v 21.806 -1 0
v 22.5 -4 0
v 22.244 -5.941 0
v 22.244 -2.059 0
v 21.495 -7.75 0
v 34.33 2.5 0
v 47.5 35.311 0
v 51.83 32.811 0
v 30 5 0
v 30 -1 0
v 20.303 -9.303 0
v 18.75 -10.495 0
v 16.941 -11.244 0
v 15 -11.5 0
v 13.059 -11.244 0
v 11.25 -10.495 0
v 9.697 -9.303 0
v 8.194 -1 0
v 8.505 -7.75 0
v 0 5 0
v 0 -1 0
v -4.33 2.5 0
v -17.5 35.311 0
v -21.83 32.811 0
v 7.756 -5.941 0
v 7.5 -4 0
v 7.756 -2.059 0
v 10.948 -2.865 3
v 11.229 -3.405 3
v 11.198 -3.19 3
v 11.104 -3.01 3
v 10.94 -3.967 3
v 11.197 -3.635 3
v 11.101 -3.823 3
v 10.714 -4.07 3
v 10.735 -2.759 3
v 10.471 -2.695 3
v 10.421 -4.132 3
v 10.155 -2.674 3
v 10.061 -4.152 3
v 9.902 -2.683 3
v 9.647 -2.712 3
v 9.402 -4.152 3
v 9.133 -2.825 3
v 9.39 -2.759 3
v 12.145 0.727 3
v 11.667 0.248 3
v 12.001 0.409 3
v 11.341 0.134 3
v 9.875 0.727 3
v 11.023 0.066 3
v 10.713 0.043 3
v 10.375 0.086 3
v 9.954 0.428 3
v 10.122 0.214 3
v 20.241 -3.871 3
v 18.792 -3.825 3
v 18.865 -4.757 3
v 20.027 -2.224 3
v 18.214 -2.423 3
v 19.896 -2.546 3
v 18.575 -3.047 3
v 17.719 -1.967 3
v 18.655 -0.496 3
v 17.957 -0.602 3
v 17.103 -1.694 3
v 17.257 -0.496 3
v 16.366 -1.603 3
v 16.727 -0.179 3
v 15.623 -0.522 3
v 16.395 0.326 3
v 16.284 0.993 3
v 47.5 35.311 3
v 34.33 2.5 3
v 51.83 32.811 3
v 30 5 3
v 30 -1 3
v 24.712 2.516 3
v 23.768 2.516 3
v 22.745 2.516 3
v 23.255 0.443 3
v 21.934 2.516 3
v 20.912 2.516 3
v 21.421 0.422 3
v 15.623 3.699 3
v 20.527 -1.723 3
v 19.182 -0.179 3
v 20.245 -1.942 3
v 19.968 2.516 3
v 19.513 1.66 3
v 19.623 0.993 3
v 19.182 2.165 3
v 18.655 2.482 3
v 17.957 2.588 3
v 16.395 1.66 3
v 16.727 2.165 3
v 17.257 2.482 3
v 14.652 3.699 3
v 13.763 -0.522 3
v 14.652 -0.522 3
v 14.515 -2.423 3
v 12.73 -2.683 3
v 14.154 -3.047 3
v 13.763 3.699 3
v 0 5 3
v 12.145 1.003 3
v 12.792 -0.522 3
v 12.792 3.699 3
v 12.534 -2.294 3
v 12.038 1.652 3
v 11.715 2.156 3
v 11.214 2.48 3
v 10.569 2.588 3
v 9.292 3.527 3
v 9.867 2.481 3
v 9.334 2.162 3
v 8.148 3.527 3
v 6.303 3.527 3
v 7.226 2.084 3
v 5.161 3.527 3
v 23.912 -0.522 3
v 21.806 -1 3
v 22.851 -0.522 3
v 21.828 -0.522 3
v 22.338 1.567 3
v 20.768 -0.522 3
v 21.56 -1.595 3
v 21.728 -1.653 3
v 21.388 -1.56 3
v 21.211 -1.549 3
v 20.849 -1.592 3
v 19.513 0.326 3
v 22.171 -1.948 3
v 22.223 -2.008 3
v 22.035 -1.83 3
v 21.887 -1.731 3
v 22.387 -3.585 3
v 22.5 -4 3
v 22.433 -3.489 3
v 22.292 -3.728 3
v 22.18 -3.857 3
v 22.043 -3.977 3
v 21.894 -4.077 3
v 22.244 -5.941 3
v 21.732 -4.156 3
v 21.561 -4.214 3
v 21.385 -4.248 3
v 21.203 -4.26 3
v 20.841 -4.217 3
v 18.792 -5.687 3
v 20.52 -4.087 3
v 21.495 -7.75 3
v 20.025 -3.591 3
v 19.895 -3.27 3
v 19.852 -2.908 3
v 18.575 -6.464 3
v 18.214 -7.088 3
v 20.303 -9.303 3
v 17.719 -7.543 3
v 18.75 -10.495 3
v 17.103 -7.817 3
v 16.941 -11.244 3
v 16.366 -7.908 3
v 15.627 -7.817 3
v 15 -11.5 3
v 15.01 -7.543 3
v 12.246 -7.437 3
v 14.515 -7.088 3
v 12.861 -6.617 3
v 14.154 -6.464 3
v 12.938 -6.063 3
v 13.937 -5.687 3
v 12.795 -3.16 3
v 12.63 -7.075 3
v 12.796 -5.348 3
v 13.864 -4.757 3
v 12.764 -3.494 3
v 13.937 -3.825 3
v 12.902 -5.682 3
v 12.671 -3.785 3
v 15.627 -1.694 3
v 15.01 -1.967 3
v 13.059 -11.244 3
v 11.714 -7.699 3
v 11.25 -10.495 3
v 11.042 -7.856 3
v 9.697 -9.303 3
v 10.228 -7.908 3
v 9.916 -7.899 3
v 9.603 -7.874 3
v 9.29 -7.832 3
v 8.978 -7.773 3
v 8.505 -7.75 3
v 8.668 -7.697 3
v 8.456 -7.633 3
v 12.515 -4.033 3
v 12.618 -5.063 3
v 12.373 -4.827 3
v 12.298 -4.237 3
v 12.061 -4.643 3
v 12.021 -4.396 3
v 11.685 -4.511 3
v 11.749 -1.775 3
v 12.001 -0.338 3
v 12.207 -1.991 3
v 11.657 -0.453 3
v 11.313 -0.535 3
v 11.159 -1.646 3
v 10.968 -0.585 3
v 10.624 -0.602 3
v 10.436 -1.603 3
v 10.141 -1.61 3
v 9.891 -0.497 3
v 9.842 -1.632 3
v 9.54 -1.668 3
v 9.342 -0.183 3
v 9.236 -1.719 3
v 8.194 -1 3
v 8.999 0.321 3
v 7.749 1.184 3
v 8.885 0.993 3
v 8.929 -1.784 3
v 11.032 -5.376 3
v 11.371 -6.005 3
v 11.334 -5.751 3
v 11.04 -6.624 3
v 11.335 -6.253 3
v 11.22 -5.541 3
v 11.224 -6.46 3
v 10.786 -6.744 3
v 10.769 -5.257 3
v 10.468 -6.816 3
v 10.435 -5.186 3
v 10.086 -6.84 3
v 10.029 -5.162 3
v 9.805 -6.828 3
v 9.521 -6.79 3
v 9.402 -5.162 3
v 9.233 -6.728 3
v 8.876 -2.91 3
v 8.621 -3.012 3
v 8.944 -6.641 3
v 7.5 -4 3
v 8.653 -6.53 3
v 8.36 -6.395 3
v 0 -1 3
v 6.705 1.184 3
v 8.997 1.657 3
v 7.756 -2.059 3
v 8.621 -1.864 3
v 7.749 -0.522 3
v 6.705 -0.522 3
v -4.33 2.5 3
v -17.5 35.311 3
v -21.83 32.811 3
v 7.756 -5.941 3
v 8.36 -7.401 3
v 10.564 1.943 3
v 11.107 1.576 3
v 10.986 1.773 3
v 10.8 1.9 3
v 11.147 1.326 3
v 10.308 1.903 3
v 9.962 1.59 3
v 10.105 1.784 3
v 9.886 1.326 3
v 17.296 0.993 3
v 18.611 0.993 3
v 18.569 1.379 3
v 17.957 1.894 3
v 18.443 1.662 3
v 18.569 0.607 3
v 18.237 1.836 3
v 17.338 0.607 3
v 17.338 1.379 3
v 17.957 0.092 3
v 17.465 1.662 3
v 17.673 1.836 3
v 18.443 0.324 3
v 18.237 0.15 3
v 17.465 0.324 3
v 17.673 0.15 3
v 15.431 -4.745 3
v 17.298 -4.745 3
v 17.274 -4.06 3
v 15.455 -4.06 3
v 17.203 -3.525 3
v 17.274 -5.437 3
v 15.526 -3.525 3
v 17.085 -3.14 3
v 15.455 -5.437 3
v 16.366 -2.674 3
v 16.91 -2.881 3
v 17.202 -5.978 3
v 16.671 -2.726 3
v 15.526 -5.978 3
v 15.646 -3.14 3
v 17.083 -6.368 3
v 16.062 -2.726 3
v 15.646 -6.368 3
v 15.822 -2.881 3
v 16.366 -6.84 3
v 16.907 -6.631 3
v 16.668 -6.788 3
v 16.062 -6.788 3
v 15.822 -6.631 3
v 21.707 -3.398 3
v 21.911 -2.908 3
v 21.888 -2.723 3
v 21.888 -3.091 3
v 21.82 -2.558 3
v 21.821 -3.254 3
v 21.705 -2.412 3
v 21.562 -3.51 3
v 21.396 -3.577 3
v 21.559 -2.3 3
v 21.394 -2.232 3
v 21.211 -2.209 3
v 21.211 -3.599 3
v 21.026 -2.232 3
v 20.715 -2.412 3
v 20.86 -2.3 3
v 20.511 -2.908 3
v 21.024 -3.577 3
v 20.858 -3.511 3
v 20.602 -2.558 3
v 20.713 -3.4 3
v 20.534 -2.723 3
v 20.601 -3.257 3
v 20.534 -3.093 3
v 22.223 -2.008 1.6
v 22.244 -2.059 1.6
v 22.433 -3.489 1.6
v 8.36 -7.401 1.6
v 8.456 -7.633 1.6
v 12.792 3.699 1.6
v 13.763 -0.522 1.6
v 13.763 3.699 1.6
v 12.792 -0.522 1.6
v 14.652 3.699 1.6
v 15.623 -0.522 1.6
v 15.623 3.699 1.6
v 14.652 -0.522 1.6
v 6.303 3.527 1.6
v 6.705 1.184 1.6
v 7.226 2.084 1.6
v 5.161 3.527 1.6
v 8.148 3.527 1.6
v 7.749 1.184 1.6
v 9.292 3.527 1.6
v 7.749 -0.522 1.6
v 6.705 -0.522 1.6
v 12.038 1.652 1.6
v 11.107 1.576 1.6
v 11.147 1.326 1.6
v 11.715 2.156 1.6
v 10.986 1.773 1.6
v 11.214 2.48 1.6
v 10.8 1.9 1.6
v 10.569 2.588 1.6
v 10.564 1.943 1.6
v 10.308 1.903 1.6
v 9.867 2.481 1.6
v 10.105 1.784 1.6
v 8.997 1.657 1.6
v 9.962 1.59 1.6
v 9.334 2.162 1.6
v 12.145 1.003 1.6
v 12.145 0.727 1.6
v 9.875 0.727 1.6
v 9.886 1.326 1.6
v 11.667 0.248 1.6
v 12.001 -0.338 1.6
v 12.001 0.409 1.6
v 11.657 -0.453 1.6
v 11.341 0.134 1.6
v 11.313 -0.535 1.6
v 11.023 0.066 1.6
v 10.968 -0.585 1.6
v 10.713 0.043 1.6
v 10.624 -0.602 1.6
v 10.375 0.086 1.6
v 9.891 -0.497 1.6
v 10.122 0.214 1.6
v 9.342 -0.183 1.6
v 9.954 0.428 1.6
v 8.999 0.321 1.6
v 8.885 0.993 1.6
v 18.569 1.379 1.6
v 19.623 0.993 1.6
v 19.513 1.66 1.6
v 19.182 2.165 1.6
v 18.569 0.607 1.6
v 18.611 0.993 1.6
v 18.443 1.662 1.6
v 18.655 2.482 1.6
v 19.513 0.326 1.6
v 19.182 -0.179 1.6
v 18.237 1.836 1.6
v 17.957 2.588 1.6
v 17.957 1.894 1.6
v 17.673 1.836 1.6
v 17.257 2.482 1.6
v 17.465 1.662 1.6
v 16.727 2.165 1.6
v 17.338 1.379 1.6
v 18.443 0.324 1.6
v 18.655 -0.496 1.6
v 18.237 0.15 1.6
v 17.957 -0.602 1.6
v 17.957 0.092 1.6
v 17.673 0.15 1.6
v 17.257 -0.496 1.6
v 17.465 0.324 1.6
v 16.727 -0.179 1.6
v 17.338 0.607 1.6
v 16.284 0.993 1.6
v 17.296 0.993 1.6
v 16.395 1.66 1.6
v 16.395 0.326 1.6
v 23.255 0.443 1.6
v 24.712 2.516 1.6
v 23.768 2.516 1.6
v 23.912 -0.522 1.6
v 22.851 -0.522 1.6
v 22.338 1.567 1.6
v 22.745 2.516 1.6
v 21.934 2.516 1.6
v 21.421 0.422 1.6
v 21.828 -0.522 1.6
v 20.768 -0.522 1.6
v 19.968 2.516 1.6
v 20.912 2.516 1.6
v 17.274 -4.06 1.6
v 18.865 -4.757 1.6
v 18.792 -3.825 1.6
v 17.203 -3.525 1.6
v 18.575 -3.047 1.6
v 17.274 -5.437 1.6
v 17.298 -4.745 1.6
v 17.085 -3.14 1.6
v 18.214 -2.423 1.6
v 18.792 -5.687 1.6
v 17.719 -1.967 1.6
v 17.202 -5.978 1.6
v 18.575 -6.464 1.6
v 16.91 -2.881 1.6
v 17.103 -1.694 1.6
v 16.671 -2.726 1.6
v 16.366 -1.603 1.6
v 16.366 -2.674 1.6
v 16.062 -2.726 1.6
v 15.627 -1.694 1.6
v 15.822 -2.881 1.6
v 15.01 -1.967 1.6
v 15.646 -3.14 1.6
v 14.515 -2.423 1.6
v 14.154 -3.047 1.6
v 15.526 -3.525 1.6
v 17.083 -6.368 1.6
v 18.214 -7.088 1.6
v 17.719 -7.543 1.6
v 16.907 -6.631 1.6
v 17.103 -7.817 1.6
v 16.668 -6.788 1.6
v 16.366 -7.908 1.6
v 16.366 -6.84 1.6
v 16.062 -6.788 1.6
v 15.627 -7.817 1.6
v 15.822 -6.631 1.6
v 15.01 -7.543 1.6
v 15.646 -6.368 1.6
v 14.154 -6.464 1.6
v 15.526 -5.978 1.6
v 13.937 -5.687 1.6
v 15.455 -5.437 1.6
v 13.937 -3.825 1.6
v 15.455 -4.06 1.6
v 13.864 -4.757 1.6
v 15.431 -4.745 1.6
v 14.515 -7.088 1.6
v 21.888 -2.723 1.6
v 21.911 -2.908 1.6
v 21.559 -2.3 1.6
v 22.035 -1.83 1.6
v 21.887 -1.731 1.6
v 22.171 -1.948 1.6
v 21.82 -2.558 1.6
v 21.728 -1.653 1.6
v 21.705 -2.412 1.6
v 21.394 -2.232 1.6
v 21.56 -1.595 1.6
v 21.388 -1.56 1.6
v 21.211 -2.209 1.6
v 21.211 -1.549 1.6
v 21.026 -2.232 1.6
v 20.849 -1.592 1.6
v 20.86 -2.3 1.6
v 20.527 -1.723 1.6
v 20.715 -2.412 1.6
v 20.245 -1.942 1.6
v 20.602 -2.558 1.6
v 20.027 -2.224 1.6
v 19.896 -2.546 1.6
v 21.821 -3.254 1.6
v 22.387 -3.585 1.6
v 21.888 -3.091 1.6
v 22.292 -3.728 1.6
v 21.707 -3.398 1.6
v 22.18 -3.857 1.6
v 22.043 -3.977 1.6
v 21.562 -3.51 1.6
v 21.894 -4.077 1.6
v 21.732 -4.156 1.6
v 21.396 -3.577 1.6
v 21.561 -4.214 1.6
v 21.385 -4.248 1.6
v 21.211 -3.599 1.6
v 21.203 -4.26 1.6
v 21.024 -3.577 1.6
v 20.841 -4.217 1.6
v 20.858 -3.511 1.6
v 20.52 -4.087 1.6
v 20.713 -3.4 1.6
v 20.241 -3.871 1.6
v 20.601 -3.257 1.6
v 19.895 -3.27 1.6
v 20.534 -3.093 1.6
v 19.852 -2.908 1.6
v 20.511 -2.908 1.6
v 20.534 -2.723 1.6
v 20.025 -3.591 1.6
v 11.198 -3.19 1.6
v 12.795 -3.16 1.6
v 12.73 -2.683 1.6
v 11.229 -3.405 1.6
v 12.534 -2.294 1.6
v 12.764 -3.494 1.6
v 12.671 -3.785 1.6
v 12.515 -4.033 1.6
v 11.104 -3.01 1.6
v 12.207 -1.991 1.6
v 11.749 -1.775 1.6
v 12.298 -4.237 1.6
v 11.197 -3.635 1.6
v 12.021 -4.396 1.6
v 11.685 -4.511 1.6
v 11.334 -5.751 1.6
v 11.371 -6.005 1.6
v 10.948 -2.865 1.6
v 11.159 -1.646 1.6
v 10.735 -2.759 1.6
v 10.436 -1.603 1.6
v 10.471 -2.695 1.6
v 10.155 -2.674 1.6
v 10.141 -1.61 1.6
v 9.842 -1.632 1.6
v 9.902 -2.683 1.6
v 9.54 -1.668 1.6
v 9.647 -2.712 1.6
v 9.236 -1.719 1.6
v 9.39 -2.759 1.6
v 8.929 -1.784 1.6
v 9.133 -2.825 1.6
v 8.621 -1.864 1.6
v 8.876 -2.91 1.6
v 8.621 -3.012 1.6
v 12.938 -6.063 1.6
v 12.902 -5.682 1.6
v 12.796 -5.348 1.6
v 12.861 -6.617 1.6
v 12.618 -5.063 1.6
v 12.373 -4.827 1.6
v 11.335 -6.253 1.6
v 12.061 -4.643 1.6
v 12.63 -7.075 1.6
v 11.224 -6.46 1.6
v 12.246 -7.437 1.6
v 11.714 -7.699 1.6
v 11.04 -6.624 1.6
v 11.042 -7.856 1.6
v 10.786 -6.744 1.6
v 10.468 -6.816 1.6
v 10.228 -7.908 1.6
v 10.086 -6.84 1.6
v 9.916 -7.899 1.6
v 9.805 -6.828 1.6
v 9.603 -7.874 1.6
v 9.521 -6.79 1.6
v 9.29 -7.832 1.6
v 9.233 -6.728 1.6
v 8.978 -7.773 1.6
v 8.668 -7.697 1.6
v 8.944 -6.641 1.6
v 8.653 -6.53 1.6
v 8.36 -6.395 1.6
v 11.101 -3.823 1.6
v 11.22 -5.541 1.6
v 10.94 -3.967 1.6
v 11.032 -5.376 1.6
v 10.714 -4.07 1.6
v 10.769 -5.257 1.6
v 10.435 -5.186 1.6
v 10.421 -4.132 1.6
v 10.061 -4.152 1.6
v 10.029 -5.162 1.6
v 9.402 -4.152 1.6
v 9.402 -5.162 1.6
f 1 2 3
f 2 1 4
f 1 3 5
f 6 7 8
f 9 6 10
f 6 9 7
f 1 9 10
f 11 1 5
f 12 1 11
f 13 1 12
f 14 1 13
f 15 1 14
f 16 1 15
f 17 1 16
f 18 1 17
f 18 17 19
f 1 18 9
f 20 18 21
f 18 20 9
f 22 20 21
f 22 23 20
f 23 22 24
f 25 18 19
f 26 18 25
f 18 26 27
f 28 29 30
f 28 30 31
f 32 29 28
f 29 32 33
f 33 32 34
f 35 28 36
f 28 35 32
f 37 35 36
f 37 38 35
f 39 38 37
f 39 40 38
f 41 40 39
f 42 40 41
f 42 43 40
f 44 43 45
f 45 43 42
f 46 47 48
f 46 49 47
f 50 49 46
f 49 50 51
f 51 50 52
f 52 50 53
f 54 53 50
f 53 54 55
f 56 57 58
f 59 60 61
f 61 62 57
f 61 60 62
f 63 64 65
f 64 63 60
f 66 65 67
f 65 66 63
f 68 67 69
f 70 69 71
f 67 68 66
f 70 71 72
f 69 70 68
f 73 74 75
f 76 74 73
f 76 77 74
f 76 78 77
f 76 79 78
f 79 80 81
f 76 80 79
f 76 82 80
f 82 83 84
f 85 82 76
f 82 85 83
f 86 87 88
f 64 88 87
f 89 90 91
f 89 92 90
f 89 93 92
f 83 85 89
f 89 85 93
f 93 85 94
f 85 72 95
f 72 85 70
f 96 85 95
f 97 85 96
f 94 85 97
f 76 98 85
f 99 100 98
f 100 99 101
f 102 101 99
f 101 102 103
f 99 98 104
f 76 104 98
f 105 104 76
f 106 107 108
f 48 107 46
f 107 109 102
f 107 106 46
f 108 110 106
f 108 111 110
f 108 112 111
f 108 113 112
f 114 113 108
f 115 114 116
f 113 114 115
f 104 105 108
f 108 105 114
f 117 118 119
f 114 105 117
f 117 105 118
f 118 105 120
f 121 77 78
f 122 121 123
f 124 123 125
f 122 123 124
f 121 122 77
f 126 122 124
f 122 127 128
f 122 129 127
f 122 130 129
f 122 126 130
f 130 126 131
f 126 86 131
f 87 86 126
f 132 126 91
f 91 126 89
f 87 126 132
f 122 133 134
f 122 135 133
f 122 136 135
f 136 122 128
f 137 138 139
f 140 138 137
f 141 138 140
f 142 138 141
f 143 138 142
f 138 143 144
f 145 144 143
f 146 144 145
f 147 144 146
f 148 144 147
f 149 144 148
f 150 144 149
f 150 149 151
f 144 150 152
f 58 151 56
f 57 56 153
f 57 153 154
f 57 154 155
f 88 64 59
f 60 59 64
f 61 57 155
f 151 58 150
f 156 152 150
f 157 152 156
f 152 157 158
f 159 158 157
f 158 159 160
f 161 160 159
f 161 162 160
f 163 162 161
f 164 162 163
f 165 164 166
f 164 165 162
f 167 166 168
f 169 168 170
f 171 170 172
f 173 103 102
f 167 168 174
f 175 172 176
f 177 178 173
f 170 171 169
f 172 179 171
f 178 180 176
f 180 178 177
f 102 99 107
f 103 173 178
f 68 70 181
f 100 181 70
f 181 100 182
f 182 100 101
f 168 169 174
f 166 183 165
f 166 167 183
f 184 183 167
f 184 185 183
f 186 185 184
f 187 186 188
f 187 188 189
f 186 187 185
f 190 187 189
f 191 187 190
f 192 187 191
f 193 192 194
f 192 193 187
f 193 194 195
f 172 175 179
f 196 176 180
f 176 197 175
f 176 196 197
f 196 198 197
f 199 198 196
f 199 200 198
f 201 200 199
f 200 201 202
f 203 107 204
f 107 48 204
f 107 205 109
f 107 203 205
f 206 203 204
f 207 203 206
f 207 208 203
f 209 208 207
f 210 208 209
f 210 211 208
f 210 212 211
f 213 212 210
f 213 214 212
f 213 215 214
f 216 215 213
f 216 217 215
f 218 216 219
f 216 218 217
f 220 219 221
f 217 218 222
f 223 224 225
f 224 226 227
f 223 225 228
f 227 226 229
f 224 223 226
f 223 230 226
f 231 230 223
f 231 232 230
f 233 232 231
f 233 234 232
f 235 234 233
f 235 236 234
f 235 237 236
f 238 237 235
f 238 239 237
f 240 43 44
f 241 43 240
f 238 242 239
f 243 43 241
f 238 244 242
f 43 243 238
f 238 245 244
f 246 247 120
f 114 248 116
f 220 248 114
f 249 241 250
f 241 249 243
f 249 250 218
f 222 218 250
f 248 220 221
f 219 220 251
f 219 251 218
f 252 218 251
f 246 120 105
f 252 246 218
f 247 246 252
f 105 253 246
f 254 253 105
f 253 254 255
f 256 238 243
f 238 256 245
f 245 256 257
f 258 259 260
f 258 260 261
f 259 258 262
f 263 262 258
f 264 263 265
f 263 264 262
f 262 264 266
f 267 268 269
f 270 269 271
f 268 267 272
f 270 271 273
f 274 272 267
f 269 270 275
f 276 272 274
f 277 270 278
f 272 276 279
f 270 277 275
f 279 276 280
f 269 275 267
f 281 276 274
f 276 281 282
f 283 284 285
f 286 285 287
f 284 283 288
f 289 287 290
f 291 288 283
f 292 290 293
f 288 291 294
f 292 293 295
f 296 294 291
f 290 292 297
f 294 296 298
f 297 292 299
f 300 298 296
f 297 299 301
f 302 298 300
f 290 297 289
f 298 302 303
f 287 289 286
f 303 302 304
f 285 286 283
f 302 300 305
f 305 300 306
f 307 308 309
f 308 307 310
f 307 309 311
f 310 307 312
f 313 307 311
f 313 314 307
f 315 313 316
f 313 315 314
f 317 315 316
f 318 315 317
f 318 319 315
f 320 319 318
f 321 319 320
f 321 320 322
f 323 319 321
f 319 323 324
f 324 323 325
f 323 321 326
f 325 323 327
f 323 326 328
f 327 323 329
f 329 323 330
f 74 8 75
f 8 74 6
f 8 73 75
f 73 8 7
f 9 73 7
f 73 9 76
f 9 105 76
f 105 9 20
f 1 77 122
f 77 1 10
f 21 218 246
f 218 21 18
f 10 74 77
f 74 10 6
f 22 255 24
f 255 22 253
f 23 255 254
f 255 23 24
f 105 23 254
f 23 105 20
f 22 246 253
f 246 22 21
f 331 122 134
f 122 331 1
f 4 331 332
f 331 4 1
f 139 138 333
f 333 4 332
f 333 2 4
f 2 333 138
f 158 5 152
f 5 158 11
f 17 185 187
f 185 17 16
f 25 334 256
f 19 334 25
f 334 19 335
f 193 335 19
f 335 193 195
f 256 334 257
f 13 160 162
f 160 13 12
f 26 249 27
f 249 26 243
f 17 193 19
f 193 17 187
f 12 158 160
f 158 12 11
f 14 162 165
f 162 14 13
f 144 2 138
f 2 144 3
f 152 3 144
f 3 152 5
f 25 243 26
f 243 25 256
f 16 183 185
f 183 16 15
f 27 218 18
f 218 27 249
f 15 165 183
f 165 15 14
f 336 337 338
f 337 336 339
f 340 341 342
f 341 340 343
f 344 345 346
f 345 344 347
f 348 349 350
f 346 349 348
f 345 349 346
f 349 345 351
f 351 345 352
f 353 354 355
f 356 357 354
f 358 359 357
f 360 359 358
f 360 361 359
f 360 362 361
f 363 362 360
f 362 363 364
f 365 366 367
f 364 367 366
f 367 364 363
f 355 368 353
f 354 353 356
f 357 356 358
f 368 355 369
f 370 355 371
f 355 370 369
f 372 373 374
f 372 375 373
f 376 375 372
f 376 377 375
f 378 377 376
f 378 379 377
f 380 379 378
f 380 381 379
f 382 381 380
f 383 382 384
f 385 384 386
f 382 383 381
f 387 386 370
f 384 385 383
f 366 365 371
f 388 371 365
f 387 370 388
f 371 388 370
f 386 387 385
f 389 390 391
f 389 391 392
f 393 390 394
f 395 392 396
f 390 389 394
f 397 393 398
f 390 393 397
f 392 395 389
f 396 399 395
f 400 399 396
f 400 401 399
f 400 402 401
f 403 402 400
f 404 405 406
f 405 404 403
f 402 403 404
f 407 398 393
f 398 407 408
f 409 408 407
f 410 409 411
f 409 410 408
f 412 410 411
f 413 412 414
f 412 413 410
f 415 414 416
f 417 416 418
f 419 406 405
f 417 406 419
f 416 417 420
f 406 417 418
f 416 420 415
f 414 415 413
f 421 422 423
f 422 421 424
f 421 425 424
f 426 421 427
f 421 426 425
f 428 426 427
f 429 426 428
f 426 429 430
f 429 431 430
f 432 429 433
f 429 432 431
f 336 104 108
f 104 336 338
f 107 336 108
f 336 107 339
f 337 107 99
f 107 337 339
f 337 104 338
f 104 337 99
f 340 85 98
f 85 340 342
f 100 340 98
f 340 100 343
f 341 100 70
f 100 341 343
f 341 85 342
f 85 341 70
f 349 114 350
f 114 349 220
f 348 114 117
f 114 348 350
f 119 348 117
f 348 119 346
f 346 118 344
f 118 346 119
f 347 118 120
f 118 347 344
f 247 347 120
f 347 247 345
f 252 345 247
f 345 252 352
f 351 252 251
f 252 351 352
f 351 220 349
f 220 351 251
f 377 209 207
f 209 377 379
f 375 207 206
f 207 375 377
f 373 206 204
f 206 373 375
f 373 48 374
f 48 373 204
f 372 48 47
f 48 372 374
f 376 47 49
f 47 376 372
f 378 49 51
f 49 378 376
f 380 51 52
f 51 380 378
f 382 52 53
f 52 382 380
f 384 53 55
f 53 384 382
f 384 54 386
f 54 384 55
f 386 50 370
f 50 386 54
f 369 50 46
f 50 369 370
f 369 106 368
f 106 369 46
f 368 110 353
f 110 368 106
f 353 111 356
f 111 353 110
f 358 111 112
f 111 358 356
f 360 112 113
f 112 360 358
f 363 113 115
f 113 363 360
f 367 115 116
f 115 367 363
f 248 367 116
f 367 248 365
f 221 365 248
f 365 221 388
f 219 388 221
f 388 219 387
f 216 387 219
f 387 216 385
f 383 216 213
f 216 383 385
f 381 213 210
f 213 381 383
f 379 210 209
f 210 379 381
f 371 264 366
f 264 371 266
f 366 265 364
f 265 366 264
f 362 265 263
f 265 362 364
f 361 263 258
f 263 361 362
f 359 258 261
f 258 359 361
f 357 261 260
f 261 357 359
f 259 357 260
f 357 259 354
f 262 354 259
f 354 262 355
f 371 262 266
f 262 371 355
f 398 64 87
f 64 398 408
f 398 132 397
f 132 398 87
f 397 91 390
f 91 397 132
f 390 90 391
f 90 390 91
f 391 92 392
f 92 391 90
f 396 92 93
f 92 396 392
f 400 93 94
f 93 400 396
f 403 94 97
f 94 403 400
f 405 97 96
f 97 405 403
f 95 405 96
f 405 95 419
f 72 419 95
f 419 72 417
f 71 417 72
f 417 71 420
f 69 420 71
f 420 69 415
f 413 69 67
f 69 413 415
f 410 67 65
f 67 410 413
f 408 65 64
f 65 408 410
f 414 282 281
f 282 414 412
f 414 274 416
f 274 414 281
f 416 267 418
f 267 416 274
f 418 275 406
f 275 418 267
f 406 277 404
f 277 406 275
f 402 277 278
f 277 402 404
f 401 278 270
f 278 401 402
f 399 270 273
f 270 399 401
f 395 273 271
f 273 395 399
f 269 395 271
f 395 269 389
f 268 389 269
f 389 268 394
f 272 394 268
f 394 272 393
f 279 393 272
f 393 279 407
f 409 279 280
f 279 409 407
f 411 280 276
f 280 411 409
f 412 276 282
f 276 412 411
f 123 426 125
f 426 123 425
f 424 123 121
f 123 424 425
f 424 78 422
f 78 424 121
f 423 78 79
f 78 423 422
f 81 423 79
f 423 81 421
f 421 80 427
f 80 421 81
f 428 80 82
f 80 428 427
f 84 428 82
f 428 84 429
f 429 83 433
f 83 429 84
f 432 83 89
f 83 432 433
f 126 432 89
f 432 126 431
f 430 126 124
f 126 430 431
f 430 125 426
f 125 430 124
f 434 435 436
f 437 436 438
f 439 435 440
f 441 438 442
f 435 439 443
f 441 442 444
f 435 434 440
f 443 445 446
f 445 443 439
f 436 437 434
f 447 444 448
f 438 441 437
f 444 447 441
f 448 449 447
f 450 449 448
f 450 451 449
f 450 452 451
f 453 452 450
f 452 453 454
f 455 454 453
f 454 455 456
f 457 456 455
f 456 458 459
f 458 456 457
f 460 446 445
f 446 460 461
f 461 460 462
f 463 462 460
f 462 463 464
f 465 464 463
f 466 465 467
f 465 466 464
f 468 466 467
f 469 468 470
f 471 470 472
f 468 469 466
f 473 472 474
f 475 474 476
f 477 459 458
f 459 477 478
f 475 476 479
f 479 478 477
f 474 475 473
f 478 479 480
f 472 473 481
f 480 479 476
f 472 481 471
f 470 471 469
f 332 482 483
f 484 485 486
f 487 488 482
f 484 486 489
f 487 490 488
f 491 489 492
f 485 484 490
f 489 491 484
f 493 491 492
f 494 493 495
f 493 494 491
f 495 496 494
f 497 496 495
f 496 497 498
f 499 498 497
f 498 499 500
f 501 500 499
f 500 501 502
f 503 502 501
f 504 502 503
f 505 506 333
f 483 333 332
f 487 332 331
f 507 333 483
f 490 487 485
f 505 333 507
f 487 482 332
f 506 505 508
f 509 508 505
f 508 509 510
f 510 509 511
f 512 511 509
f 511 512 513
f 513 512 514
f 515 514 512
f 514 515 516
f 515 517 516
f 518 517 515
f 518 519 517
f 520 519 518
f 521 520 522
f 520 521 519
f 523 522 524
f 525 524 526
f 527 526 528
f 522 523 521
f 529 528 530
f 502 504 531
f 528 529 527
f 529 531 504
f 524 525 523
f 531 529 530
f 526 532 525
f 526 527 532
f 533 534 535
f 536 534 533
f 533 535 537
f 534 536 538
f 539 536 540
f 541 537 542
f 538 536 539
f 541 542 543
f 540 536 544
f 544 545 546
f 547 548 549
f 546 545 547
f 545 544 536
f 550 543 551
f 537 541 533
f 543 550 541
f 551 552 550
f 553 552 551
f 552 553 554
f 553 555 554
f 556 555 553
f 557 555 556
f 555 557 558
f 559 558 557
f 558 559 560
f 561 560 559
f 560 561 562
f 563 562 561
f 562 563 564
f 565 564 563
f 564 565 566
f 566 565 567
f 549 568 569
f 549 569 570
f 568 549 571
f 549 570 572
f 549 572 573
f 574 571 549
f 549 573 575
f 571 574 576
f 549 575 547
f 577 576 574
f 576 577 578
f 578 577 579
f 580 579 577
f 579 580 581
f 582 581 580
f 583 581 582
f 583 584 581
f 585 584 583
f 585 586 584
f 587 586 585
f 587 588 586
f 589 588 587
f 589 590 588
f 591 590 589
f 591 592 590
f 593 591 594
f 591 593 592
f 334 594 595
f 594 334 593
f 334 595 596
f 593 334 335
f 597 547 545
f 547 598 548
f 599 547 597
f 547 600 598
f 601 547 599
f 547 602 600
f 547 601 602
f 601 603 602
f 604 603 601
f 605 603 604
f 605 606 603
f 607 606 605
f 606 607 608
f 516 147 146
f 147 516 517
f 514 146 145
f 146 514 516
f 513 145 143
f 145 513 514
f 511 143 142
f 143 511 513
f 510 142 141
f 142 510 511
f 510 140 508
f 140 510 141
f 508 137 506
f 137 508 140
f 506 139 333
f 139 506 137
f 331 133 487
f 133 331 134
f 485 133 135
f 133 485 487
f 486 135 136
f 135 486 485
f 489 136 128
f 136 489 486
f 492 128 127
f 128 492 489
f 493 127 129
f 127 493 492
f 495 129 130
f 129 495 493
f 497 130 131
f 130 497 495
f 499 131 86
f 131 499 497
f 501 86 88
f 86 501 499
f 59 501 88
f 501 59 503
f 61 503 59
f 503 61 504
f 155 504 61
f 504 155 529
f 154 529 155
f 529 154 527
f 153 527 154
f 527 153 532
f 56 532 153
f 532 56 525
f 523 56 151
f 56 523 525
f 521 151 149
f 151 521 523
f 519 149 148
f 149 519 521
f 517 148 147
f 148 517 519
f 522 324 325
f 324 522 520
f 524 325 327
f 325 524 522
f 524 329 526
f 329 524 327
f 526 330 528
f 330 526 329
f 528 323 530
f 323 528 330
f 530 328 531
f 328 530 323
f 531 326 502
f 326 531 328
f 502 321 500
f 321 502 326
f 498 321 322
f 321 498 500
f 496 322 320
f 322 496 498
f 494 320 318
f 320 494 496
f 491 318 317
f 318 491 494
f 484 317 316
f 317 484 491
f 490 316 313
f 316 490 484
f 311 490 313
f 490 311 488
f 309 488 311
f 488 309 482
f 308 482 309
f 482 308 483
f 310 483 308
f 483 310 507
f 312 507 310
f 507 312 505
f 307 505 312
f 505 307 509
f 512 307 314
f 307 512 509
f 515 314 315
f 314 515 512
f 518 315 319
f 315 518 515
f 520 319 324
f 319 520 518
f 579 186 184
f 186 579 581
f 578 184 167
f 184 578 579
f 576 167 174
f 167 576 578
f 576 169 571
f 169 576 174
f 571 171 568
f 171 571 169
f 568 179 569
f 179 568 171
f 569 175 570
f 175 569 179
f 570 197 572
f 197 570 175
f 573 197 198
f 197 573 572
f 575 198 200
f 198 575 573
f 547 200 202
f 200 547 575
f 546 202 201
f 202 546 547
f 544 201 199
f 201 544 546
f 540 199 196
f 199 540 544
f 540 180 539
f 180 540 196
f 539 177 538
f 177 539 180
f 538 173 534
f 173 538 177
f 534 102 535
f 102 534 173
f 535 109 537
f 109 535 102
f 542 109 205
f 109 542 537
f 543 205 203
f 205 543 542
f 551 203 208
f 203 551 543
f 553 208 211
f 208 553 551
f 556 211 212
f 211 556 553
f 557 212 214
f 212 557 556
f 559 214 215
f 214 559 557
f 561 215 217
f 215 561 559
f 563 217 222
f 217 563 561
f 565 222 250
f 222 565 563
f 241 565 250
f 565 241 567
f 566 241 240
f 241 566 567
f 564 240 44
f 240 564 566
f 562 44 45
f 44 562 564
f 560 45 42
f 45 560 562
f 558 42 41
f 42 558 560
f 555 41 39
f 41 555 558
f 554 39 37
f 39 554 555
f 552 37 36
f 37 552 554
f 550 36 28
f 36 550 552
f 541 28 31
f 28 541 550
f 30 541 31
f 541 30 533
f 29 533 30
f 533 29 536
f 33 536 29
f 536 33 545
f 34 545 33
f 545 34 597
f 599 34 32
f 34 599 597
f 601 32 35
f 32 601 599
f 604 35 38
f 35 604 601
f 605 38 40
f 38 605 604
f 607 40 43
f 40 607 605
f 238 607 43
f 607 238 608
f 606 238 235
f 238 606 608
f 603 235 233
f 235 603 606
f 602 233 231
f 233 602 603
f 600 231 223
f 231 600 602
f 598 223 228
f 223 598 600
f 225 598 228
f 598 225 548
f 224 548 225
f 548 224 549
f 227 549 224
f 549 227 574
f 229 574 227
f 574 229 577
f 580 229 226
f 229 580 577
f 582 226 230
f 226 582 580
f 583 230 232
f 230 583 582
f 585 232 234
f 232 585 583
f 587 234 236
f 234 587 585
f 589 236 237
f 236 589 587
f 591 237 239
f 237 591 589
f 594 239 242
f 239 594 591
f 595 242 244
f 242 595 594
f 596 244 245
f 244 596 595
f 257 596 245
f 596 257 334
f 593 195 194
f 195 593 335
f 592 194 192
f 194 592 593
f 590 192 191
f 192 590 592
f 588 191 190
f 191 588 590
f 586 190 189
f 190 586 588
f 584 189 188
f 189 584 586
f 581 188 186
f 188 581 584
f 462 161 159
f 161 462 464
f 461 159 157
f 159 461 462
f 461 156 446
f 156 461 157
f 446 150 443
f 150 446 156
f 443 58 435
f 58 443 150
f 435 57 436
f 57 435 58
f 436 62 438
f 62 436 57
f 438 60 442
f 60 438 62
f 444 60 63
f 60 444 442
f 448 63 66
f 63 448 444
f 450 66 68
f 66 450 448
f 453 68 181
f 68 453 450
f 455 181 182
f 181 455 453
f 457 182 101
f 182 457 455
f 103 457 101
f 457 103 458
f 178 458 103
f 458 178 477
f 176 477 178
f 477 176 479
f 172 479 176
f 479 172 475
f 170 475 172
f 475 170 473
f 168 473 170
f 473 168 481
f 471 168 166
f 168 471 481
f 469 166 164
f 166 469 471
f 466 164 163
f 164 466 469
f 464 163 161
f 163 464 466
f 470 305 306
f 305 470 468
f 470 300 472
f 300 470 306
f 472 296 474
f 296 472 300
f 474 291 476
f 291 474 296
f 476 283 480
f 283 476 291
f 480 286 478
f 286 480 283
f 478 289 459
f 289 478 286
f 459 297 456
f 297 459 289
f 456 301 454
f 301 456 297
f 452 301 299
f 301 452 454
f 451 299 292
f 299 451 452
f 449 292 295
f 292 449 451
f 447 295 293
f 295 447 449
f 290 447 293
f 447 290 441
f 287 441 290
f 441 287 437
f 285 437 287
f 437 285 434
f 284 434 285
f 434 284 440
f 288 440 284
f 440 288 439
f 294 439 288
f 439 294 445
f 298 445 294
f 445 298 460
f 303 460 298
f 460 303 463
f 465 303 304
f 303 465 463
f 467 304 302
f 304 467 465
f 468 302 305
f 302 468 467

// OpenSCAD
// Armada 30 degree turn template

turnAngle = 30.00 ;

baseWidth=30.00 ; height=3.00 ;
armLength = 35.00;
baseDepth = 5.00 ;

points = [[0,baseDepth],[baseWidth,baseDepth]
         ,[baseWidth+armLength*sin(turnAngle), baseDepth+armLength*cos(turnAngle)]
         ,[baseWidth+armLength*sin(turnAngle)+baseDepth*cos(turnAngle), baseDepth+armLength*cos(turnAngle) - baseDepth*sin(turnAngle) ]
         ,[baseWidth+baseDepth*cos(turnAngle), baseDepth - baseDepth*sin(turnAngle) ]
         ,[baseWidth,-1.00], [0,-1.00]
] ;

difference() {
union() {
linear_extrude(height=height) polygon(points);
translate([baseWidth,0,0])mirror([1,0,0])linear_extrude(height=height) polygon(points);

translate([baseWidth/2,-4,0]) color("orange") cylinder(r=7.5,h=height) ;
}
translate([baseWidth/2,baseDepth/2-1,1.6])
linear_extrude(height=2.0)
   text("Yellow", font="Arial Nova:style=Bold",size=4, valign="center", halign="center");

translate([baseWidth/2+.5,-4.8,1.6])
linear_extrude(height=1.5)
   text("30°", size=6, font="Arial Nova:style=Bold", valign="center", halign="center");
}

/*
translate([baseWidth/2,2,1.6])
linear_extrude(height=1.5)
   text("Yellow", font="Arial Nova:style=Bold",size=3, valign="center", halign="center");

translate([baseWidth/2+0.5,-4.8,1.6])
linear_extrude(height=1.5)
   text("30°", size=6, font="Arial Nova:style=Bold", valign="center", halign="center");
}
*/

//check base gap!
//translate([0,5.2,0]) cube([baseWidth,2,3]) ;
